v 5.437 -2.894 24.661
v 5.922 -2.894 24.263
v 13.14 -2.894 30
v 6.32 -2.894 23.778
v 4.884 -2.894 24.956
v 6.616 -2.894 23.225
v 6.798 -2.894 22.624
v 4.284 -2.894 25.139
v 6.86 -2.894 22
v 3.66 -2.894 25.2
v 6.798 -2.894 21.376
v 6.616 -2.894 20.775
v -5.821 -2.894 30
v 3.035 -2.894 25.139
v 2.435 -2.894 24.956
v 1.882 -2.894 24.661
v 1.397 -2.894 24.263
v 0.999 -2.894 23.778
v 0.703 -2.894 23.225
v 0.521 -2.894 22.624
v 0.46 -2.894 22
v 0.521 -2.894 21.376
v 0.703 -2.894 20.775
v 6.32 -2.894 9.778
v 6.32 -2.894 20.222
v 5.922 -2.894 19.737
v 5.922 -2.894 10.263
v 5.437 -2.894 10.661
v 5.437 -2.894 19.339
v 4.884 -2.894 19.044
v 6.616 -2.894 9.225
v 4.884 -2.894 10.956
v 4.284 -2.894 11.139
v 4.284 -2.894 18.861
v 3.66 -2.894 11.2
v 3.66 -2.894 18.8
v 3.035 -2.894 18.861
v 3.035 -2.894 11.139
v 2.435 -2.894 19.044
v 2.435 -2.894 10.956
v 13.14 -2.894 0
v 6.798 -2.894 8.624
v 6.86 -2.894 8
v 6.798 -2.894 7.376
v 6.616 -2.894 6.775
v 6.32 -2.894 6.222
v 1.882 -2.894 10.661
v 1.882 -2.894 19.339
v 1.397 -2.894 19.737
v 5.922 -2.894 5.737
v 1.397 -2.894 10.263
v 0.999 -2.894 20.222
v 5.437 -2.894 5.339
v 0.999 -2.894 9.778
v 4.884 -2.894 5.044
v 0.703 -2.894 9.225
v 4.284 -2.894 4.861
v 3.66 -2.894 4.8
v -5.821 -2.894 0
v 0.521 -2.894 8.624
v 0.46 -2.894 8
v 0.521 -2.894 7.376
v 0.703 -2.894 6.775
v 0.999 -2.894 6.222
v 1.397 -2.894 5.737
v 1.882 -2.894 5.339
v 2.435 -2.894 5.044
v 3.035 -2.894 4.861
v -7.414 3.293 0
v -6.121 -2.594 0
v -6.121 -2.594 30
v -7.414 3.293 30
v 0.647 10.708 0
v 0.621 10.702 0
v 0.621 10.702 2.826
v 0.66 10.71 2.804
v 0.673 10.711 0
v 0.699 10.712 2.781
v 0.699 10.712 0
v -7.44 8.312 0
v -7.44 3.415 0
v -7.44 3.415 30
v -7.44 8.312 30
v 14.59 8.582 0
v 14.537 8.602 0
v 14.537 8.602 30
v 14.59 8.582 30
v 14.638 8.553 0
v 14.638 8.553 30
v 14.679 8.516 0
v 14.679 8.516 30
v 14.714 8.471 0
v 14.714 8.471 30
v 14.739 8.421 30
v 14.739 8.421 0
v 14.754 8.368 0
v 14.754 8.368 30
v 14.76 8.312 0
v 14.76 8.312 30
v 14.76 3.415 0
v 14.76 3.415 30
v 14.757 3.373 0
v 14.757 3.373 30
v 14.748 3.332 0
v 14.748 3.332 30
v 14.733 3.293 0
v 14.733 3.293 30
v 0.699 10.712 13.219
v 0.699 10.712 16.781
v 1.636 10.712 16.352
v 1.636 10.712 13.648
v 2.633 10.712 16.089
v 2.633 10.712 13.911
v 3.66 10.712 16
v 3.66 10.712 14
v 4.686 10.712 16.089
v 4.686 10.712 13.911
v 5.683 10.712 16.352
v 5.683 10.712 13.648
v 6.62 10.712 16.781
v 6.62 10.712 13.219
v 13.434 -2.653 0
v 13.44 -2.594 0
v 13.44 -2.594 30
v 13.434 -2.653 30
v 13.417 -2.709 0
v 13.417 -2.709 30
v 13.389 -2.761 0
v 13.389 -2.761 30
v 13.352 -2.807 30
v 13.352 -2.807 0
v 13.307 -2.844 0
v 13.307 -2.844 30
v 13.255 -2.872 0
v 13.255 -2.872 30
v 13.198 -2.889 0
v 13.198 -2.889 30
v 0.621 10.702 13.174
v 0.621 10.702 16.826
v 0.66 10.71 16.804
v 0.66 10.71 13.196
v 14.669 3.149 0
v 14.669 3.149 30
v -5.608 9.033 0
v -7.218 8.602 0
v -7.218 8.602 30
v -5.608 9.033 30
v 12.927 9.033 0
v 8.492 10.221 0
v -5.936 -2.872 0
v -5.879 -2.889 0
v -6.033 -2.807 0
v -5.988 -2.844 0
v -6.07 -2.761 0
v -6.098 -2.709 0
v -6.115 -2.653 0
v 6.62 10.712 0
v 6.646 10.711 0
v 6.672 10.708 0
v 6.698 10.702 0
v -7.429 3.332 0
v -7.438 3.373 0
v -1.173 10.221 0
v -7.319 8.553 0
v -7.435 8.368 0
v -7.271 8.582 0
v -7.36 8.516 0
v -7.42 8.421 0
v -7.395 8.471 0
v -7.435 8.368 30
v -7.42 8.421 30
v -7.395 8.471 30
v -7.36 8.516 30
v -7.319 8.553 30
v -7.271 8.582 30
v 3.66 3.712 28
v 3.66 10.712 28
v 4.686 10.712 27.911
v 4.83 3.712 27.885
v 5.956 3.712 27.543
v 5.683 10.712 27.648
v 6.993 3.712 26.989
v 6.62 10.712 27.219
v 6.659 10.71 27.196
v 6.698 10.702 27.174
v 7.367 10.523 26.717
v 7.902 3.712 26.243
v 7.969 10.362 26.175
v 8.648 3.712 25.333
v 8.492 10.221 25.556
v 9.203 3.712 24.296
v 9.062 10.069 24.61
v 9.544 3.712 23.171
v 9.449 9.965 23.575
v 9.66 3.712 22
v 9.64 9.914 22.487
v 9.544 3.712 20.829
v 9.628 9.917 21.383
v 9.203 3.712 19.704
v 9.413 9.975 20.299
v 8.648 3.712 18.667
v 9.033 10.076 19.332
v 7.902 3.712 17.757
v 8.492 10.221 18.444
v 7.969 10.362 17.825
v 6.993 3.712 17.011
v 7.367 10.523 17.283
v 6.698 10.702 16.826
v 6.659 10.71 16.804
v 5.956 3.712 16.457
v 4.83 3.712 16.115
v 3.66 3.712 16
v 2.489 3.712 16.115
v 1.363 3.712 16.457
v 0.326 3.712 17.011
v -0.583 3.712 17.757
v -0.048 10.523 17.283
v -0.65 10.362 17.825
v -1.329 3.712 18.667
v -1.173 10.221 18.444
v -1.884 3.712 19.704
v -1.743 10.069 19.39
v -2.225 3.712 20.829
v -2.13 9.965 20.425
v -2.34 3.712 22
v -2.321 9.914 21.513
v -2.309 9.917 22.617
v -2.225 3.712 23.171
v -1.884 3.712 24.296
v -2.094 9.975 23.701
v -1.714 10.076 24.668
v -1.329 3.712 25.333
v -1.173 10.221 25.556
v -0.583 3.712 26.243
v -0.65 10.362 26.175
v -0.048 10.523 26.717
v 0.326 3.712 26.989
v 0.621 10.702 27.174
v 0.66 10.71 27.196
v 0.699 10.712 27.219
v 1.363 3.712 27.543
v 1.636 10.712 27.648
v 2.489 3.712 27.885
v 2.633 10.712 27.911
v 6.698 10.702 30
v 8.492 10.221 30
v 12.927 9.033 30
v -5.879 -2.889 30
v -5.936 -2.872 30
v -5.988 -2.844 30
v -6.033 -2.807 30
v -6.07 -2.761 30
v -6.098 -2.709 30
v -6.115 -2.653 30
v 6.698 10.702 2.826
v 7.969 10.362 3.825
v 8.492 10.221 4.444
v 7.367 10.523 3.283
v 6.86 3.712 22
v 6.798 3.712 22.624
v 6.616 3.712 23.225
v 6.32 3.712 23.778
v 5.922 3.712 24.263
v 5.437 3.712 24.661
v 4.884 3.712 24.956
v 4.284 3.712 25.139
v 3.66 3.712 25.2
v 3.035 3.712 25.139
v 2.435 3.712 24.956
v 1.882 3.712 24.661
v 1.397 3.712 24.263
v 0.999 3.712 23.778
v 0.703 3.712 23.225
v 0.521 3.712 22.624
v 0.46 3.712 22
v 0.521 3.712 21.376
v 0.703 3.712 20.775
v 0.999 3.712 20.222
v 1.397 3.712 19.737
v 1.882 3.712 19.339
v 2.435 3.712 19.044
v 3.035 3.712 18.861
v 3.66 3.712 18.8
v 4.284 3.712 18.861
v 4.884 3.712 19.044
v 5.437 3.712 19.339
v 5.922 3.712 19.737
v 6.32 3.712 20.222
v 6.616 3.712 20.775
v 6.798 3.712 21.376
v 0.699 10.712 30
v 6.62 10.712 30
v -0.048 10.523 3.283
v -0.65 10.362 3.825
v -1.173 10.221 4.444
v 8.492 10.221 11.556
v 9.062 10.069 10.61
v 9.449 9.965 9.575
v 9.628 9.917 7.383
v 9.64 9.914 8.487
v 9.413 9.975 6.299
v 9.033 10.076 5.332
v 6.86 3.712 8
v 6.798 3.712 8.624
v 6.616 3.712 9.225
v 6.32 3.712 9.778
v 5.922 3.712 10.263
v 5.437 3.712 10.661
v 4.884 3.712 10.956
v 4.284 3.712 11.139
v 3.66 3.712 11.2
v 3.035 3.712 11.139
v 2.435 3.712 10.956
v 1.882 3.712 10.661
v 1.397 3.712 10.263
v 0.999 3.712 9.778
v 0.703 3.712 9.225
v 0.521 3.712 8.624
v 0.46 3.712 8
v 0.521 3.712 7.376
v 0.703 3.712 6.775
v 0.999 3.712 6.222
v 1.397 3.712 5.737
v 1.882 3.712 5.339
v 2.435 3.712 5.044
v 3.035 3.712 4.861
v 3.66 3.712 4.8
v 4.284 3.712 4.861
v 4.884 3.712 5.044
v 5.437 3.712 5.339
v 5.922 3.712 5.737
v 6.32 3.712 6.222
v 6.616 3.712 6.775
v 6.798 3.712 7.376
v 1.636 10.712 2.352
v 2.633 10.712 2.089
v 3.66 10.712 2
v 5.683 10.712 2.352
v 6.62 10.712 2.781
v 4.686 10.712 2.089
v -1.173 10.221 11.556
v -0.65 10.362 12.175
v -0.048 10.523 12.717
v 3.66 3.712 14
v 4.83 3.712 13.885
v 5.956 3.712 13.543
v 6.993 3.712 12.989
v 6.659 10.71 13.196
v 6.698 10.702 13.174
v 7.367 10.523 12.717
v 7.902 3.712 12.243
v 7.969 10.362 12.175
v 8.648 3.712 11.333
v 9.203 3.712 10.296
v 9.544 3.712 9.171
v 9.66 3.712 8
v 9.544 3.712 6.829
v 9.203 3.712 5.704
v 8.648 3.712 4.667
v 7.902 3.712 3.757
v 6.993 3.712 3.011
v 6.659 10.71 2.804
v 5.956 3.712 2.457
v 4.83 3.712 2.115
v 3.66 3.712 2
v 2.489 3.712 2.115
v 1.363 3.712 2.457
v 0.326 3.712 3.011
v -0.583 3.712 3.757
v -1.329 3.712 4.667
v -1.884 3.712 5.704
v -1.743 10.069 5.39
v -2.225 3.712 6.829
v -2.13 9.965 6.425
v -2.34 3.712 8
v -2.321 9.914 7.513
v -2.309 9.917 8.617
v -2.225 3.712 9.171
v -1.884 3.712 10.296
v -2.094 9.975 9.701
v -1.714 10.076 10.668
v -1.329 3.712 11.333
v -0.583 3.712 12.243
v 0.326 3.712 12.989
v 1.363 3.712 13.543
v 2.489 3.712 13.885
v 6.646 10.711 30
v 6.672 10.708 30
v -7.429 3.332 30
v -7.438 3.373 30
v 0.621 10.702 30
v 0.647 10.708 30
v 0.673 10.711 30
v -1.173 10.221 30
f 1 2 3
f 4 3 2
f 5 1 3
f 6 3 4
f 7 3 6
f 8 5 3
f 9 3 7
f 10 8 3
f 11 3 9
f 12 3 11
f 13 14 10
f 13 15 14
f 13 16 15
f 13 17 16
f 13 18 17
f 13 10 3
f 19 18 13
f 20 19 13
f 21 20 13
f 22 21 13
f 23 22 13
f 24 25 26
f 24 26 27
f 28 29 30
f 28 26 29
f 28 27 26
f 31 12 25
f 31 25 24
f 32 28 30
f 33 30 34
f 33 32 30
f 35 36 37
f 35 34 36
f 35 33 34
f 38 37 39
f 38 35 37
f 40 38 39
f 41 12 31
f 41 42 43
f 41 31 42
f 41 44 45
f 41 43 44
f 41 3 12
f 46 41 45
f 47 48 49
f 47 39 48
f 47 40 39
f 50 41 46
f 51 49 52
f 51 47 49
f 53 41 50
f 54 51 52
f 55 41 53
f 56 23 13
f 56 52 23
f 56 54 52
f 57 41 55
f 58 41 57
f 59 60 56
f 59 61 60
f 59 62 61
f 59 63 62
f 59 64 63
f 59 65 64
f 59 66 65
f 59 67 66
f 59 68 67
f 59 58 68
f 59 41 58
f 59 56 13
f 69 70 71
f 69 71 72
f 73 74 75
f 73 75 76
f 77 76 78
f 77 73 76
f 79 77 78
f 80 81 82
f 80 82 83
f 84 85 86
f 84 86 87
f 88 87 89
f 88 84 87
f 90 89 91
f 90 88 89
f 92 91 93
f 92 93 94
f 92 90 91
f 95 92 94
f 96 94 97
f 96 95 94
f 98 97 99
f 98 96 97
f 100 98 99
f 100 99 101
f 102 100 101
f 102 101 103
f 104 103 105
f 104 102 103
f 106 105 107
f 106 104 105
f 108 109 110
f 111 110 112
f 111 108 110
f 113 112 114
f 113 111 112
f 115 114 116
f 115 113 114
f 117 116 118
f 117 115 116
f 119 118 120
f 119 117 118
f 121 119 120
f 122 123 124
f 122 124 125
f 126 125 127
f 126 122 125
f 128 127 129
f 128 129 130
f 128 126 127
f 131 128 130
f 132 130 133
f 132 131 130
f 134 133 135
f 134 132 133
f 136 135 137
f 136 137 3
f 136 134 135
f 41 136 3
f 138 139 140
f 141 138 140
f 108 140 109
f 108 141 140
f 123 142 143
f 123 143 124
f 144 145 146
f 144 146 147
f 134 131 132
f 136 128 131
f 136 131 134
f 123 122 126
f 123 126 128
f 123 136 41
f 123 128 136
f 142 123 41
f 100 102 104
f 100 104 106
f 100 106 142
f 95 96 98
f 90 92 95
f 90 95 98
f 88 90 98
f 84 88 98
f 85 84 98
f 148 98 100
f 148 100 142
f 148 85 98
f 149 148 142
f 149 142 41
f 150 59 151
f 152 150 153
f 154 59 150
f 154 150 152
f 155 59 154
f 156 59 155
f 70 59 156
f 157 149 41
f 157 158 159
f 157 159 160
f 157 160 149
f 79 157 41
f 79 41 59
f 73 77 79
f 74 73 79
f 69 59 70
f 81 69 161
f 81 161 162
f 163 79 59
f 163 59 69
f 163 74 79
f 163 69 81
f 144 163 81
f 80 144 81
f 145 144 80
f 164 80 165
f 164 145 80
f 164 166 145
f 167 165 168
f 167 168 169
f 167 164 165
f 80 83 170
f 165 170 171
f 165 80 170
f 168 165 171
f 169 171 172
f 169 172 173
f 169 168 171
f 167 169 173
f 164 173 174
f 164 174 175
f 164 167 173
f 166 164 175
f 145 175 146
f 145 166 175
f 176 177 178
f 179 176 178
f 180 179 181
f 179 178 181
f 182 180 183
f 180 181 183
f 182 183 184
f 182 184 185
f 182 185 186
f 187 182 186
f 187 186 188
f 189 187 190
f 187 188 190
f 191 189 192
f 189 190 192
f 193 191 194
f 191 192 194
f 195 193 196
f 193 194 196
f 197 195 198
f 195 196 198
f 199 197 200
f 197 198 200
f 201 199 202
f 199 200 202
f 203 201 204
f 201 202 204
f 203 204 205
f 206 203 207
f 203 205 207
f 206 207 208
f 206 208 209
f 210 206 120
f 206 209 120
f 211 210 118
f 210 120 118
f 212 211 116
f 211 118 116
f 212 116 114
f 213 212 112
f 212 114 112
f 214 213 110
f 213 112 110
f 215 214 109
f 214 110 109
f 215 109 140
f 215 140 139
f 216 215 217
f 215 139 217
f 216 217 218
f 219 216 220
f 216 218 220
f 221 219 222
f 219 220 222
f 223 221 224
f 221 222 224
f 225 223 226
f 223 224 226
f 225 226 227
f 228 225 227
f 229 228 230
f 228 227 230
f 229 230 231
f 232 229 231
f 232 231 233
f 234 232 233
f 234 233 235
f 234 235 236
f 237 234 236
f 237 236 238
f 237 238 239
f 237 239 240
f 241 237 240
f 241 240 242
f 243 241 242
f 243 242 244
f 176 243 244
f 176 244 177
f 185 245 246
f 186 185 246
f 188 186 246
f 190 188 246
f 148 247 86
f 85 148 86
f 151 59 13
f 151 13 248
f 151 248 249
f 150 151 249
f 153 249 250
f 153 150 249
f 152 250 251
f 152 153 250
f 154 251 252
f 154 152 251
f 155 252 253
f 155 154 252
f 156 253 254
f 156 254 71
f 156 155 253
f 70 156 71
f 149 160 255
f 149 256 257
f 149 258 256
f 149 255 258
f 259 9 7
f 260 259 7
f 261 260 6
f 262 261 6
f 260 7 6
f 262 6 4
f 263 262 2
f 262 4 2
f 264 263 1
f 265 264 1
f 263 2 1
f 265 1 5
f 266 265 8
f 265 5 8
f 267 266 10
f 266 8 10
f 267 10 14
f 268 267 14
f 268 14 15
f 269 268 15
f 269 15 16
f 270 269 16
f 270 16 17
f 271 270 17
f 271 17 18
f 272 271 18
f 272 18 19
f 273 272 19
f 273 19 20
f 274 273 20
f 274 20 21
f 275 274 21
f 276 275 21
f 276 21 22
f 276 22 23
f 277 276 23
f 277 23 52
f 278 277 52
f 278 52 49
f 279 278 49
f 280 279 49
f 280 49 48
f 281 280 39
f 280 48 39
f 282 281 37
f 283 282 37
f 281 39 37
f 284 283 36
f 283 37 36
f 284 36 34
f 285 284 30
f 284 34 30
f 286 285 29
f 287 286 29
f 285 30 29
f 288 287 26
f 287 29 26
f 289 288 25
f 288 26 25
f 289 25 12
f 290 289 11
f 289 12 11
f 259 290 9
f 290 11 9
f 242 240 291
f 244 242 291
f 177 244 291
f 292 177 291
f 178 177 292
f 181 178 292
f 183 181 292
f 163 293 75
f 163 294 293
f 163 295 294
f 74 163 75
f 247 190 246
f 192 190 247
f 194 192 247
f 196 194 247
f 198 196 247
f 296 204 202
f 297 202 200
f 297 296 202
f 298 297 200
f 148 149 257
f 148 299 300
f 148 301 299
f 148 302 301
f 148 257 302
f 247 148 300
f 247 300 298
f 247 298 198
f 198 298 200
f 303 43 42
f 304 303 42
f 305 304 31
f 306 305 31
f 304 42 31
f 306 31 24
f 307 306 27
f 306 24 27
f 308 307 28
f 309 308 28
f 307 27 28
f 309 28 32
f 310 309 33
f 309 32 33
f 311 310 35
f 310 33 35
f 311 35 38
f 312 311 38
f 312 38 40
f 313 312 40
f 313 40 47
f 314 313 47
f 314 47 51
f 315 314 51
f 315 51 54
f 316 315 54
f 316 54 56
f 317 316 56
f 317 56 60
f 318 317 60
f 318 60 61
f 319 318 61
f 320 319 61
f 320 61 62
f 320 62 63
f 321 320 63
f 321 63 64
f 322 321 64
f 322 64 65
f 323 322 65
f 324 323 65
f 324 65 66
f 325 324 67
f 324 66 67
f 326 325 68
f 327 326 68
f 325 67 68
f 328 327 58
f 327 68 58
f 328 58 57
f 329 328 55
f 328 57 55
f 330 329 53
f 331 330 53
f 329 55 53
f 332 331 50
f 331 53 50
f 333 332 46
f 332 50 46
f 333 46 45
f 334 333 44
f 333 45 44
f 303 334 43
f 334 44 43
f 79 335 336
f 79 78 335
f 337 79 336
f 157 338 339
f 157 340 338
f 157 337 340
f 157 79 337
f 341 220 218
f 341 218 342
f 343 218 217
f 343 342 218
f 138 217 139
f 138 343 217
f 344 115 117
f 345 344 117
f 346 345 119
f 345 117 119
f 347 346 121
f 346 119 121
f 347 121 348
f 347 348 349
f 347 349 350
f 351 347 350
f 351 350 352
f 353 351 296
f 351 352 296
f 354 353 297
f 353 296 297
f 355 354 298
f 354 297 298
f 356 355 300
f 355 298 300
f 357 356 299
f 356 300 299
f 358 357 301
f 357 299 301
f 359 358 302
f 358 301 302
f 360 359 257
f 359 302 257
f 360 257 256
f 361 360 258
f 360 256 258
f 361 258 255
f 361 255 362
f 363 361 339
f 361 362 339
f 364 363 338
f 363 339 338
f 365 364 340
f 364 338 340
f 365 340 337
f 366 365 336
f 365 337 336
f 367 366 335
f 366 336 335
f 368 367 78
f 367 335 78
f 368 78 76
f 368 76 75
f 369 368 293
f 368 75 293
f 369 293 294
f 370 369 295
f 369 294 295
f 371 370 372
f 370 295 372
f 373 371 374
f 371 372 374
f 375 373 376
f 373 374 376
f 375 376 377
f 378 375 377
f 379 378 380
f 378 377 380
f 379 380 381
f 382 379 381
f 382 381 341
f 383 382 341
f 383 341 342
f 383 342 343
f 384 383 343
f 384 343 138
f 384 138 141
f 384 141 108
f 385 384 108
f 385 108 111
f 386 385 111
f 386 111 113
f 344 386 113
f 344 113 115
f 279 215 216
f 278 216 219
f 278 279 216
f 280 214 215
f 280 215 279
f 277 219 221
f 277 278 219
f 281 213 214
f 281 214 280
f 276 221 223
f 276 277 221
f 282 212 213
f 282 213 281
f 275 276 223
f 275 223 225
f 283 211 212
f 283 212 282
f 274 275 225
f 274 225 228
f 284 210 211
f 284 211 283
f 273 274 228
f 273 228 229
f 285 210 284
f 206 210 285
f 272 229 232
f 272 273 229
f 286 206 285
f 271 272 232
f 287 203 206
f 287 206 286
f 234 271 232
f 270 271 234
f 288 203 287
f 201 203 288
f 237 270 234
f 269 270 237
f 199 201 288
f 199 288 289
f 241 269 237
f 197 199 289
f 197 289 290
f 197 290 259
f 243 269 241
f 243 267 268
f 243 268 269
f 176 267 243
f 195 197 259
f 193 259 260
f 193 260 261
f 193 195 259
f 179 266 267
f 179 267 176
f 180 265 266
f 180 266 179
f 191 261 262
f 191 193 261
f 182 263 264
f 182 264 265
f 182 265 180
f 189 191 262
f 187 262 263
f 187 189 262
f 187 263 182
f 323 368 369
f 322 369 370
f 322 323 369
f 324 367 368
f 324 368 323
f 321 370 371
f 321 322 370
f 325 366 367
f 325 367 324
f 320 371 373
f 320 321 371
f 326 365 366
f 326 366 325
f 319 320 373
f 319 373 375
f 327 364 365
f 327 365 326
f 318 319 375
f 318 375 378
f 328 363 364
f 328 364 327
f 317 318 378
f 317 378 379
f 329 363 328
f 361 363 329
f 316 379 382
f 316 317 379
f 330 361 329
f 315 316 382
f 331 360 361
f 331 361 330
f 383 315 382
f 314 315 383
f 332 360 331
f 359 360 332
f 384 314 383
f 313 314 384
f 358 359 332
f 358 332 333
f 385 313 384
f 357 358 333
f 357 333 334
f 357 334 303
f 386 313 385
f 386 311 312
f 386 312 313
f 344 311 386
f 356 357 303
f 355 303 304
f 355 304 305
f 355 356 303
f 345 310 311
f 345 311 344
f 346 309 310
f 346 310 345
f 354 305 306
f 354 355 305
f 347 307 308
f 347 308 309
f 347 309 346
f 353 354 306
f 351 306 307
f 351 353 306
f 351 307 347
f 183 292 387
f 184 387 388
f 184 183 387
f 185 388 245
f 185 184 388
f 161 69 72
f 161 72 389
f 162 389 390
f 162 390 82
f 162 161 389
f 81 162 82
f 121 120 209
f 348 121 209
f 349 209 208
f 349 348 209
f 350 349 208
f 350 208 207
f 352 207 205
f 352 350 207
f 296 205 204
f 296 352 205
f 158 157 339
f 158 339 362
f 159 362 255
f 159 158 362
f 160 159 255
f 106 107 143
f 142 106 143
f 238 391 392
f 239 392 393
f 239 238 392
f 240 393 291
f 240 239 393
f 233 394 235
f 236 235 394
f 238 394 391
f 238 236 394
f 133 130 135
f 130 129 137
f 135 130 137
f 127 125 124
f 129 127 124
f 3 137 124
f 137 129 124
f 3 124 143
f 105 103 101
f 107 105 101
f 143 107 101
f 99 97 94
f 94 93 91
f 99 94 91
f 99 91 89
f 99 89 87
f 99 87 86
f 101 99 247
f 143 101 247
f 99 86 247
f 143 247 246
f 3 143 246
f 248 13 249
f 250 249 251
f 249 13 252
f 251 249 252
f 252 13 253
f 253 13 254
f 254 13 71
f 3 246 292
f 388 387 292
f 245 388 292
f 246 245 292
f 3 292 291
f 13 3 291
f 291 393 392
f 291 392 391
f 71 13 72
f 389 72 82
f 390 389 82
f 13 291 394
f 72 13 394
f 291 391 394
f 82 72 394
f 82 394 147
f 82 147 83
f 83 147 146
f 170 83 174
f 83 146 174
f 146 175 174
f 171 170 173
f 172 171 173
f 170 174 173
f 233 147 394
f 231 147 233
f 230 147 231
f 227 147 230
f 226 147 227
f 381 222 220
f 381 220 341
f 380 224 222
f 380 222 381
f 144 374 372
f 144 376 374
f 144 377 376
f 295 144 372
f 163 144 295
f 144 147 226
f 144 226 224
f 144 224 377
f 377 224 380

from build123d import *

# Parameters (mm, degrees)
BOSS_EXTRUDE1_DEPTH = 30
SKETCH2_R           = 3.2
CUT_EXTRUDE3_DEPTH  = 37.096941552
SKETCH4_R           = 6
CUT_EXTRUDE4_DEPTH  = 7


with BuildPart() as part:
    # Sketch1 → Boss-Extrude1 (new body)
    with BuildSketch(Plane.XY):
        with BuildLine():
            Line((-5.607917396, 9.03308876), (-1.173065904, 10.221403636))
            Line((-1.173065904, 10.221403636), (0.621358385, 10.702218175))
            ThreePointArc((0.621358385, 10.702218175), (0.659846241, 10.709873886), (0.699004099, 10.712440427))
            Line((0.699004099, 10.712440427), (6.6200126, 10.712440427))
            ThreePointArc((6.6200126, 10.712440427), (6.659170458, 10.709873886), (6.697658314, 10.702218175))
            Line((6.697658314, 10.702218175), (8.492082604, 10.221403636))
            Line((8.492082604, 10.221403636), (12.926934096, 9.03308876))
            Line((12.926934096, 9.03308876), (14.537154063, 8.60163162))
            ThreePointArc((14.537154063, 8.60163162), (14.697514352, 8.494482301), (14.75950835, 8.311853872))
            Line((14.75950835, 8.311853872), (14.75950835, 3.414909596))
            ThreePointArc((14.75950835, 3.414909596), (14.752913122, 3.352350508), (14.73341742, 3.29254203))
            Line((14.73341742, 3.29254203), (14.669480377, 3.149424564))
            Line((14.669480377, 3.149424564), (13.439893107, -2.594399862))
            ThreePointArc((13.439893107, -2.594399862), (13.352025142, -2.806531896), (13.139893107, -2.894399862))
            Line((13.139893107, -2.894399862), (-5.820876408, -2.894399862))
            ThreePointArc((-5.820876408, -2.894399862), (-6.033008442, -2.806531896), (-6.120876408, -2.594399862))
            Line((-6.120876408, -2.594399862), (-7.41440072, 3.29254203))
            ThreePointArc((-7.41440072, 3.29254203), (-7.433896423, 3.352350508), (-7.44049165, 3.414909596))
            Line((-7.44049165, 3.414909596), (-7.44049165, 8.311853872))
            ThreePointArc((-7.44049165, 8.311853872), (-7.378497652, 8.494482301), (-7.218137364, 8.60163162))
            Line((-7.218137364, 8.60163162), (-5.607917396, 9.03308876))
        make_face()
    extrude(amount=BOSS_EXTRUDE1_DEPTH)

    # Sketch2 → Cut-Extrude3 (cut, through all)
    with BuildSketch(Plane.XZ.offset(2.894399862)):
        with Locations((3.65950835, 22)):
            Circle(SKETCH2_R)
        with Locations((3.65950835, 8)):
            Circle(SKETCH2_R)
    extrude(amount=-CUT_EXTRUDE3_DEPTH, mode=Mode.SUBTRACT)

    # Sketch4 → Cut-Extrude4 (cut)
    with BuildSketch(Plane(origin=(0, 10.712440427, 0), x_dir=(1, 0, 0), z_dir=(0, 1, 0))):
        with Locations(Location((3.65950835, -8, 0), (0, 0, 270))):
            Circle(SKETCH4_R)
        with Locations(Location((3.65950835, -22, 0), (0, 0, 270))):
            Circle(SKETCH4_R)
    extrude(amount=-CUT_EXTRUDE4_DEPTH, mode=Mode.SUBTRACT)


solid = part.part
